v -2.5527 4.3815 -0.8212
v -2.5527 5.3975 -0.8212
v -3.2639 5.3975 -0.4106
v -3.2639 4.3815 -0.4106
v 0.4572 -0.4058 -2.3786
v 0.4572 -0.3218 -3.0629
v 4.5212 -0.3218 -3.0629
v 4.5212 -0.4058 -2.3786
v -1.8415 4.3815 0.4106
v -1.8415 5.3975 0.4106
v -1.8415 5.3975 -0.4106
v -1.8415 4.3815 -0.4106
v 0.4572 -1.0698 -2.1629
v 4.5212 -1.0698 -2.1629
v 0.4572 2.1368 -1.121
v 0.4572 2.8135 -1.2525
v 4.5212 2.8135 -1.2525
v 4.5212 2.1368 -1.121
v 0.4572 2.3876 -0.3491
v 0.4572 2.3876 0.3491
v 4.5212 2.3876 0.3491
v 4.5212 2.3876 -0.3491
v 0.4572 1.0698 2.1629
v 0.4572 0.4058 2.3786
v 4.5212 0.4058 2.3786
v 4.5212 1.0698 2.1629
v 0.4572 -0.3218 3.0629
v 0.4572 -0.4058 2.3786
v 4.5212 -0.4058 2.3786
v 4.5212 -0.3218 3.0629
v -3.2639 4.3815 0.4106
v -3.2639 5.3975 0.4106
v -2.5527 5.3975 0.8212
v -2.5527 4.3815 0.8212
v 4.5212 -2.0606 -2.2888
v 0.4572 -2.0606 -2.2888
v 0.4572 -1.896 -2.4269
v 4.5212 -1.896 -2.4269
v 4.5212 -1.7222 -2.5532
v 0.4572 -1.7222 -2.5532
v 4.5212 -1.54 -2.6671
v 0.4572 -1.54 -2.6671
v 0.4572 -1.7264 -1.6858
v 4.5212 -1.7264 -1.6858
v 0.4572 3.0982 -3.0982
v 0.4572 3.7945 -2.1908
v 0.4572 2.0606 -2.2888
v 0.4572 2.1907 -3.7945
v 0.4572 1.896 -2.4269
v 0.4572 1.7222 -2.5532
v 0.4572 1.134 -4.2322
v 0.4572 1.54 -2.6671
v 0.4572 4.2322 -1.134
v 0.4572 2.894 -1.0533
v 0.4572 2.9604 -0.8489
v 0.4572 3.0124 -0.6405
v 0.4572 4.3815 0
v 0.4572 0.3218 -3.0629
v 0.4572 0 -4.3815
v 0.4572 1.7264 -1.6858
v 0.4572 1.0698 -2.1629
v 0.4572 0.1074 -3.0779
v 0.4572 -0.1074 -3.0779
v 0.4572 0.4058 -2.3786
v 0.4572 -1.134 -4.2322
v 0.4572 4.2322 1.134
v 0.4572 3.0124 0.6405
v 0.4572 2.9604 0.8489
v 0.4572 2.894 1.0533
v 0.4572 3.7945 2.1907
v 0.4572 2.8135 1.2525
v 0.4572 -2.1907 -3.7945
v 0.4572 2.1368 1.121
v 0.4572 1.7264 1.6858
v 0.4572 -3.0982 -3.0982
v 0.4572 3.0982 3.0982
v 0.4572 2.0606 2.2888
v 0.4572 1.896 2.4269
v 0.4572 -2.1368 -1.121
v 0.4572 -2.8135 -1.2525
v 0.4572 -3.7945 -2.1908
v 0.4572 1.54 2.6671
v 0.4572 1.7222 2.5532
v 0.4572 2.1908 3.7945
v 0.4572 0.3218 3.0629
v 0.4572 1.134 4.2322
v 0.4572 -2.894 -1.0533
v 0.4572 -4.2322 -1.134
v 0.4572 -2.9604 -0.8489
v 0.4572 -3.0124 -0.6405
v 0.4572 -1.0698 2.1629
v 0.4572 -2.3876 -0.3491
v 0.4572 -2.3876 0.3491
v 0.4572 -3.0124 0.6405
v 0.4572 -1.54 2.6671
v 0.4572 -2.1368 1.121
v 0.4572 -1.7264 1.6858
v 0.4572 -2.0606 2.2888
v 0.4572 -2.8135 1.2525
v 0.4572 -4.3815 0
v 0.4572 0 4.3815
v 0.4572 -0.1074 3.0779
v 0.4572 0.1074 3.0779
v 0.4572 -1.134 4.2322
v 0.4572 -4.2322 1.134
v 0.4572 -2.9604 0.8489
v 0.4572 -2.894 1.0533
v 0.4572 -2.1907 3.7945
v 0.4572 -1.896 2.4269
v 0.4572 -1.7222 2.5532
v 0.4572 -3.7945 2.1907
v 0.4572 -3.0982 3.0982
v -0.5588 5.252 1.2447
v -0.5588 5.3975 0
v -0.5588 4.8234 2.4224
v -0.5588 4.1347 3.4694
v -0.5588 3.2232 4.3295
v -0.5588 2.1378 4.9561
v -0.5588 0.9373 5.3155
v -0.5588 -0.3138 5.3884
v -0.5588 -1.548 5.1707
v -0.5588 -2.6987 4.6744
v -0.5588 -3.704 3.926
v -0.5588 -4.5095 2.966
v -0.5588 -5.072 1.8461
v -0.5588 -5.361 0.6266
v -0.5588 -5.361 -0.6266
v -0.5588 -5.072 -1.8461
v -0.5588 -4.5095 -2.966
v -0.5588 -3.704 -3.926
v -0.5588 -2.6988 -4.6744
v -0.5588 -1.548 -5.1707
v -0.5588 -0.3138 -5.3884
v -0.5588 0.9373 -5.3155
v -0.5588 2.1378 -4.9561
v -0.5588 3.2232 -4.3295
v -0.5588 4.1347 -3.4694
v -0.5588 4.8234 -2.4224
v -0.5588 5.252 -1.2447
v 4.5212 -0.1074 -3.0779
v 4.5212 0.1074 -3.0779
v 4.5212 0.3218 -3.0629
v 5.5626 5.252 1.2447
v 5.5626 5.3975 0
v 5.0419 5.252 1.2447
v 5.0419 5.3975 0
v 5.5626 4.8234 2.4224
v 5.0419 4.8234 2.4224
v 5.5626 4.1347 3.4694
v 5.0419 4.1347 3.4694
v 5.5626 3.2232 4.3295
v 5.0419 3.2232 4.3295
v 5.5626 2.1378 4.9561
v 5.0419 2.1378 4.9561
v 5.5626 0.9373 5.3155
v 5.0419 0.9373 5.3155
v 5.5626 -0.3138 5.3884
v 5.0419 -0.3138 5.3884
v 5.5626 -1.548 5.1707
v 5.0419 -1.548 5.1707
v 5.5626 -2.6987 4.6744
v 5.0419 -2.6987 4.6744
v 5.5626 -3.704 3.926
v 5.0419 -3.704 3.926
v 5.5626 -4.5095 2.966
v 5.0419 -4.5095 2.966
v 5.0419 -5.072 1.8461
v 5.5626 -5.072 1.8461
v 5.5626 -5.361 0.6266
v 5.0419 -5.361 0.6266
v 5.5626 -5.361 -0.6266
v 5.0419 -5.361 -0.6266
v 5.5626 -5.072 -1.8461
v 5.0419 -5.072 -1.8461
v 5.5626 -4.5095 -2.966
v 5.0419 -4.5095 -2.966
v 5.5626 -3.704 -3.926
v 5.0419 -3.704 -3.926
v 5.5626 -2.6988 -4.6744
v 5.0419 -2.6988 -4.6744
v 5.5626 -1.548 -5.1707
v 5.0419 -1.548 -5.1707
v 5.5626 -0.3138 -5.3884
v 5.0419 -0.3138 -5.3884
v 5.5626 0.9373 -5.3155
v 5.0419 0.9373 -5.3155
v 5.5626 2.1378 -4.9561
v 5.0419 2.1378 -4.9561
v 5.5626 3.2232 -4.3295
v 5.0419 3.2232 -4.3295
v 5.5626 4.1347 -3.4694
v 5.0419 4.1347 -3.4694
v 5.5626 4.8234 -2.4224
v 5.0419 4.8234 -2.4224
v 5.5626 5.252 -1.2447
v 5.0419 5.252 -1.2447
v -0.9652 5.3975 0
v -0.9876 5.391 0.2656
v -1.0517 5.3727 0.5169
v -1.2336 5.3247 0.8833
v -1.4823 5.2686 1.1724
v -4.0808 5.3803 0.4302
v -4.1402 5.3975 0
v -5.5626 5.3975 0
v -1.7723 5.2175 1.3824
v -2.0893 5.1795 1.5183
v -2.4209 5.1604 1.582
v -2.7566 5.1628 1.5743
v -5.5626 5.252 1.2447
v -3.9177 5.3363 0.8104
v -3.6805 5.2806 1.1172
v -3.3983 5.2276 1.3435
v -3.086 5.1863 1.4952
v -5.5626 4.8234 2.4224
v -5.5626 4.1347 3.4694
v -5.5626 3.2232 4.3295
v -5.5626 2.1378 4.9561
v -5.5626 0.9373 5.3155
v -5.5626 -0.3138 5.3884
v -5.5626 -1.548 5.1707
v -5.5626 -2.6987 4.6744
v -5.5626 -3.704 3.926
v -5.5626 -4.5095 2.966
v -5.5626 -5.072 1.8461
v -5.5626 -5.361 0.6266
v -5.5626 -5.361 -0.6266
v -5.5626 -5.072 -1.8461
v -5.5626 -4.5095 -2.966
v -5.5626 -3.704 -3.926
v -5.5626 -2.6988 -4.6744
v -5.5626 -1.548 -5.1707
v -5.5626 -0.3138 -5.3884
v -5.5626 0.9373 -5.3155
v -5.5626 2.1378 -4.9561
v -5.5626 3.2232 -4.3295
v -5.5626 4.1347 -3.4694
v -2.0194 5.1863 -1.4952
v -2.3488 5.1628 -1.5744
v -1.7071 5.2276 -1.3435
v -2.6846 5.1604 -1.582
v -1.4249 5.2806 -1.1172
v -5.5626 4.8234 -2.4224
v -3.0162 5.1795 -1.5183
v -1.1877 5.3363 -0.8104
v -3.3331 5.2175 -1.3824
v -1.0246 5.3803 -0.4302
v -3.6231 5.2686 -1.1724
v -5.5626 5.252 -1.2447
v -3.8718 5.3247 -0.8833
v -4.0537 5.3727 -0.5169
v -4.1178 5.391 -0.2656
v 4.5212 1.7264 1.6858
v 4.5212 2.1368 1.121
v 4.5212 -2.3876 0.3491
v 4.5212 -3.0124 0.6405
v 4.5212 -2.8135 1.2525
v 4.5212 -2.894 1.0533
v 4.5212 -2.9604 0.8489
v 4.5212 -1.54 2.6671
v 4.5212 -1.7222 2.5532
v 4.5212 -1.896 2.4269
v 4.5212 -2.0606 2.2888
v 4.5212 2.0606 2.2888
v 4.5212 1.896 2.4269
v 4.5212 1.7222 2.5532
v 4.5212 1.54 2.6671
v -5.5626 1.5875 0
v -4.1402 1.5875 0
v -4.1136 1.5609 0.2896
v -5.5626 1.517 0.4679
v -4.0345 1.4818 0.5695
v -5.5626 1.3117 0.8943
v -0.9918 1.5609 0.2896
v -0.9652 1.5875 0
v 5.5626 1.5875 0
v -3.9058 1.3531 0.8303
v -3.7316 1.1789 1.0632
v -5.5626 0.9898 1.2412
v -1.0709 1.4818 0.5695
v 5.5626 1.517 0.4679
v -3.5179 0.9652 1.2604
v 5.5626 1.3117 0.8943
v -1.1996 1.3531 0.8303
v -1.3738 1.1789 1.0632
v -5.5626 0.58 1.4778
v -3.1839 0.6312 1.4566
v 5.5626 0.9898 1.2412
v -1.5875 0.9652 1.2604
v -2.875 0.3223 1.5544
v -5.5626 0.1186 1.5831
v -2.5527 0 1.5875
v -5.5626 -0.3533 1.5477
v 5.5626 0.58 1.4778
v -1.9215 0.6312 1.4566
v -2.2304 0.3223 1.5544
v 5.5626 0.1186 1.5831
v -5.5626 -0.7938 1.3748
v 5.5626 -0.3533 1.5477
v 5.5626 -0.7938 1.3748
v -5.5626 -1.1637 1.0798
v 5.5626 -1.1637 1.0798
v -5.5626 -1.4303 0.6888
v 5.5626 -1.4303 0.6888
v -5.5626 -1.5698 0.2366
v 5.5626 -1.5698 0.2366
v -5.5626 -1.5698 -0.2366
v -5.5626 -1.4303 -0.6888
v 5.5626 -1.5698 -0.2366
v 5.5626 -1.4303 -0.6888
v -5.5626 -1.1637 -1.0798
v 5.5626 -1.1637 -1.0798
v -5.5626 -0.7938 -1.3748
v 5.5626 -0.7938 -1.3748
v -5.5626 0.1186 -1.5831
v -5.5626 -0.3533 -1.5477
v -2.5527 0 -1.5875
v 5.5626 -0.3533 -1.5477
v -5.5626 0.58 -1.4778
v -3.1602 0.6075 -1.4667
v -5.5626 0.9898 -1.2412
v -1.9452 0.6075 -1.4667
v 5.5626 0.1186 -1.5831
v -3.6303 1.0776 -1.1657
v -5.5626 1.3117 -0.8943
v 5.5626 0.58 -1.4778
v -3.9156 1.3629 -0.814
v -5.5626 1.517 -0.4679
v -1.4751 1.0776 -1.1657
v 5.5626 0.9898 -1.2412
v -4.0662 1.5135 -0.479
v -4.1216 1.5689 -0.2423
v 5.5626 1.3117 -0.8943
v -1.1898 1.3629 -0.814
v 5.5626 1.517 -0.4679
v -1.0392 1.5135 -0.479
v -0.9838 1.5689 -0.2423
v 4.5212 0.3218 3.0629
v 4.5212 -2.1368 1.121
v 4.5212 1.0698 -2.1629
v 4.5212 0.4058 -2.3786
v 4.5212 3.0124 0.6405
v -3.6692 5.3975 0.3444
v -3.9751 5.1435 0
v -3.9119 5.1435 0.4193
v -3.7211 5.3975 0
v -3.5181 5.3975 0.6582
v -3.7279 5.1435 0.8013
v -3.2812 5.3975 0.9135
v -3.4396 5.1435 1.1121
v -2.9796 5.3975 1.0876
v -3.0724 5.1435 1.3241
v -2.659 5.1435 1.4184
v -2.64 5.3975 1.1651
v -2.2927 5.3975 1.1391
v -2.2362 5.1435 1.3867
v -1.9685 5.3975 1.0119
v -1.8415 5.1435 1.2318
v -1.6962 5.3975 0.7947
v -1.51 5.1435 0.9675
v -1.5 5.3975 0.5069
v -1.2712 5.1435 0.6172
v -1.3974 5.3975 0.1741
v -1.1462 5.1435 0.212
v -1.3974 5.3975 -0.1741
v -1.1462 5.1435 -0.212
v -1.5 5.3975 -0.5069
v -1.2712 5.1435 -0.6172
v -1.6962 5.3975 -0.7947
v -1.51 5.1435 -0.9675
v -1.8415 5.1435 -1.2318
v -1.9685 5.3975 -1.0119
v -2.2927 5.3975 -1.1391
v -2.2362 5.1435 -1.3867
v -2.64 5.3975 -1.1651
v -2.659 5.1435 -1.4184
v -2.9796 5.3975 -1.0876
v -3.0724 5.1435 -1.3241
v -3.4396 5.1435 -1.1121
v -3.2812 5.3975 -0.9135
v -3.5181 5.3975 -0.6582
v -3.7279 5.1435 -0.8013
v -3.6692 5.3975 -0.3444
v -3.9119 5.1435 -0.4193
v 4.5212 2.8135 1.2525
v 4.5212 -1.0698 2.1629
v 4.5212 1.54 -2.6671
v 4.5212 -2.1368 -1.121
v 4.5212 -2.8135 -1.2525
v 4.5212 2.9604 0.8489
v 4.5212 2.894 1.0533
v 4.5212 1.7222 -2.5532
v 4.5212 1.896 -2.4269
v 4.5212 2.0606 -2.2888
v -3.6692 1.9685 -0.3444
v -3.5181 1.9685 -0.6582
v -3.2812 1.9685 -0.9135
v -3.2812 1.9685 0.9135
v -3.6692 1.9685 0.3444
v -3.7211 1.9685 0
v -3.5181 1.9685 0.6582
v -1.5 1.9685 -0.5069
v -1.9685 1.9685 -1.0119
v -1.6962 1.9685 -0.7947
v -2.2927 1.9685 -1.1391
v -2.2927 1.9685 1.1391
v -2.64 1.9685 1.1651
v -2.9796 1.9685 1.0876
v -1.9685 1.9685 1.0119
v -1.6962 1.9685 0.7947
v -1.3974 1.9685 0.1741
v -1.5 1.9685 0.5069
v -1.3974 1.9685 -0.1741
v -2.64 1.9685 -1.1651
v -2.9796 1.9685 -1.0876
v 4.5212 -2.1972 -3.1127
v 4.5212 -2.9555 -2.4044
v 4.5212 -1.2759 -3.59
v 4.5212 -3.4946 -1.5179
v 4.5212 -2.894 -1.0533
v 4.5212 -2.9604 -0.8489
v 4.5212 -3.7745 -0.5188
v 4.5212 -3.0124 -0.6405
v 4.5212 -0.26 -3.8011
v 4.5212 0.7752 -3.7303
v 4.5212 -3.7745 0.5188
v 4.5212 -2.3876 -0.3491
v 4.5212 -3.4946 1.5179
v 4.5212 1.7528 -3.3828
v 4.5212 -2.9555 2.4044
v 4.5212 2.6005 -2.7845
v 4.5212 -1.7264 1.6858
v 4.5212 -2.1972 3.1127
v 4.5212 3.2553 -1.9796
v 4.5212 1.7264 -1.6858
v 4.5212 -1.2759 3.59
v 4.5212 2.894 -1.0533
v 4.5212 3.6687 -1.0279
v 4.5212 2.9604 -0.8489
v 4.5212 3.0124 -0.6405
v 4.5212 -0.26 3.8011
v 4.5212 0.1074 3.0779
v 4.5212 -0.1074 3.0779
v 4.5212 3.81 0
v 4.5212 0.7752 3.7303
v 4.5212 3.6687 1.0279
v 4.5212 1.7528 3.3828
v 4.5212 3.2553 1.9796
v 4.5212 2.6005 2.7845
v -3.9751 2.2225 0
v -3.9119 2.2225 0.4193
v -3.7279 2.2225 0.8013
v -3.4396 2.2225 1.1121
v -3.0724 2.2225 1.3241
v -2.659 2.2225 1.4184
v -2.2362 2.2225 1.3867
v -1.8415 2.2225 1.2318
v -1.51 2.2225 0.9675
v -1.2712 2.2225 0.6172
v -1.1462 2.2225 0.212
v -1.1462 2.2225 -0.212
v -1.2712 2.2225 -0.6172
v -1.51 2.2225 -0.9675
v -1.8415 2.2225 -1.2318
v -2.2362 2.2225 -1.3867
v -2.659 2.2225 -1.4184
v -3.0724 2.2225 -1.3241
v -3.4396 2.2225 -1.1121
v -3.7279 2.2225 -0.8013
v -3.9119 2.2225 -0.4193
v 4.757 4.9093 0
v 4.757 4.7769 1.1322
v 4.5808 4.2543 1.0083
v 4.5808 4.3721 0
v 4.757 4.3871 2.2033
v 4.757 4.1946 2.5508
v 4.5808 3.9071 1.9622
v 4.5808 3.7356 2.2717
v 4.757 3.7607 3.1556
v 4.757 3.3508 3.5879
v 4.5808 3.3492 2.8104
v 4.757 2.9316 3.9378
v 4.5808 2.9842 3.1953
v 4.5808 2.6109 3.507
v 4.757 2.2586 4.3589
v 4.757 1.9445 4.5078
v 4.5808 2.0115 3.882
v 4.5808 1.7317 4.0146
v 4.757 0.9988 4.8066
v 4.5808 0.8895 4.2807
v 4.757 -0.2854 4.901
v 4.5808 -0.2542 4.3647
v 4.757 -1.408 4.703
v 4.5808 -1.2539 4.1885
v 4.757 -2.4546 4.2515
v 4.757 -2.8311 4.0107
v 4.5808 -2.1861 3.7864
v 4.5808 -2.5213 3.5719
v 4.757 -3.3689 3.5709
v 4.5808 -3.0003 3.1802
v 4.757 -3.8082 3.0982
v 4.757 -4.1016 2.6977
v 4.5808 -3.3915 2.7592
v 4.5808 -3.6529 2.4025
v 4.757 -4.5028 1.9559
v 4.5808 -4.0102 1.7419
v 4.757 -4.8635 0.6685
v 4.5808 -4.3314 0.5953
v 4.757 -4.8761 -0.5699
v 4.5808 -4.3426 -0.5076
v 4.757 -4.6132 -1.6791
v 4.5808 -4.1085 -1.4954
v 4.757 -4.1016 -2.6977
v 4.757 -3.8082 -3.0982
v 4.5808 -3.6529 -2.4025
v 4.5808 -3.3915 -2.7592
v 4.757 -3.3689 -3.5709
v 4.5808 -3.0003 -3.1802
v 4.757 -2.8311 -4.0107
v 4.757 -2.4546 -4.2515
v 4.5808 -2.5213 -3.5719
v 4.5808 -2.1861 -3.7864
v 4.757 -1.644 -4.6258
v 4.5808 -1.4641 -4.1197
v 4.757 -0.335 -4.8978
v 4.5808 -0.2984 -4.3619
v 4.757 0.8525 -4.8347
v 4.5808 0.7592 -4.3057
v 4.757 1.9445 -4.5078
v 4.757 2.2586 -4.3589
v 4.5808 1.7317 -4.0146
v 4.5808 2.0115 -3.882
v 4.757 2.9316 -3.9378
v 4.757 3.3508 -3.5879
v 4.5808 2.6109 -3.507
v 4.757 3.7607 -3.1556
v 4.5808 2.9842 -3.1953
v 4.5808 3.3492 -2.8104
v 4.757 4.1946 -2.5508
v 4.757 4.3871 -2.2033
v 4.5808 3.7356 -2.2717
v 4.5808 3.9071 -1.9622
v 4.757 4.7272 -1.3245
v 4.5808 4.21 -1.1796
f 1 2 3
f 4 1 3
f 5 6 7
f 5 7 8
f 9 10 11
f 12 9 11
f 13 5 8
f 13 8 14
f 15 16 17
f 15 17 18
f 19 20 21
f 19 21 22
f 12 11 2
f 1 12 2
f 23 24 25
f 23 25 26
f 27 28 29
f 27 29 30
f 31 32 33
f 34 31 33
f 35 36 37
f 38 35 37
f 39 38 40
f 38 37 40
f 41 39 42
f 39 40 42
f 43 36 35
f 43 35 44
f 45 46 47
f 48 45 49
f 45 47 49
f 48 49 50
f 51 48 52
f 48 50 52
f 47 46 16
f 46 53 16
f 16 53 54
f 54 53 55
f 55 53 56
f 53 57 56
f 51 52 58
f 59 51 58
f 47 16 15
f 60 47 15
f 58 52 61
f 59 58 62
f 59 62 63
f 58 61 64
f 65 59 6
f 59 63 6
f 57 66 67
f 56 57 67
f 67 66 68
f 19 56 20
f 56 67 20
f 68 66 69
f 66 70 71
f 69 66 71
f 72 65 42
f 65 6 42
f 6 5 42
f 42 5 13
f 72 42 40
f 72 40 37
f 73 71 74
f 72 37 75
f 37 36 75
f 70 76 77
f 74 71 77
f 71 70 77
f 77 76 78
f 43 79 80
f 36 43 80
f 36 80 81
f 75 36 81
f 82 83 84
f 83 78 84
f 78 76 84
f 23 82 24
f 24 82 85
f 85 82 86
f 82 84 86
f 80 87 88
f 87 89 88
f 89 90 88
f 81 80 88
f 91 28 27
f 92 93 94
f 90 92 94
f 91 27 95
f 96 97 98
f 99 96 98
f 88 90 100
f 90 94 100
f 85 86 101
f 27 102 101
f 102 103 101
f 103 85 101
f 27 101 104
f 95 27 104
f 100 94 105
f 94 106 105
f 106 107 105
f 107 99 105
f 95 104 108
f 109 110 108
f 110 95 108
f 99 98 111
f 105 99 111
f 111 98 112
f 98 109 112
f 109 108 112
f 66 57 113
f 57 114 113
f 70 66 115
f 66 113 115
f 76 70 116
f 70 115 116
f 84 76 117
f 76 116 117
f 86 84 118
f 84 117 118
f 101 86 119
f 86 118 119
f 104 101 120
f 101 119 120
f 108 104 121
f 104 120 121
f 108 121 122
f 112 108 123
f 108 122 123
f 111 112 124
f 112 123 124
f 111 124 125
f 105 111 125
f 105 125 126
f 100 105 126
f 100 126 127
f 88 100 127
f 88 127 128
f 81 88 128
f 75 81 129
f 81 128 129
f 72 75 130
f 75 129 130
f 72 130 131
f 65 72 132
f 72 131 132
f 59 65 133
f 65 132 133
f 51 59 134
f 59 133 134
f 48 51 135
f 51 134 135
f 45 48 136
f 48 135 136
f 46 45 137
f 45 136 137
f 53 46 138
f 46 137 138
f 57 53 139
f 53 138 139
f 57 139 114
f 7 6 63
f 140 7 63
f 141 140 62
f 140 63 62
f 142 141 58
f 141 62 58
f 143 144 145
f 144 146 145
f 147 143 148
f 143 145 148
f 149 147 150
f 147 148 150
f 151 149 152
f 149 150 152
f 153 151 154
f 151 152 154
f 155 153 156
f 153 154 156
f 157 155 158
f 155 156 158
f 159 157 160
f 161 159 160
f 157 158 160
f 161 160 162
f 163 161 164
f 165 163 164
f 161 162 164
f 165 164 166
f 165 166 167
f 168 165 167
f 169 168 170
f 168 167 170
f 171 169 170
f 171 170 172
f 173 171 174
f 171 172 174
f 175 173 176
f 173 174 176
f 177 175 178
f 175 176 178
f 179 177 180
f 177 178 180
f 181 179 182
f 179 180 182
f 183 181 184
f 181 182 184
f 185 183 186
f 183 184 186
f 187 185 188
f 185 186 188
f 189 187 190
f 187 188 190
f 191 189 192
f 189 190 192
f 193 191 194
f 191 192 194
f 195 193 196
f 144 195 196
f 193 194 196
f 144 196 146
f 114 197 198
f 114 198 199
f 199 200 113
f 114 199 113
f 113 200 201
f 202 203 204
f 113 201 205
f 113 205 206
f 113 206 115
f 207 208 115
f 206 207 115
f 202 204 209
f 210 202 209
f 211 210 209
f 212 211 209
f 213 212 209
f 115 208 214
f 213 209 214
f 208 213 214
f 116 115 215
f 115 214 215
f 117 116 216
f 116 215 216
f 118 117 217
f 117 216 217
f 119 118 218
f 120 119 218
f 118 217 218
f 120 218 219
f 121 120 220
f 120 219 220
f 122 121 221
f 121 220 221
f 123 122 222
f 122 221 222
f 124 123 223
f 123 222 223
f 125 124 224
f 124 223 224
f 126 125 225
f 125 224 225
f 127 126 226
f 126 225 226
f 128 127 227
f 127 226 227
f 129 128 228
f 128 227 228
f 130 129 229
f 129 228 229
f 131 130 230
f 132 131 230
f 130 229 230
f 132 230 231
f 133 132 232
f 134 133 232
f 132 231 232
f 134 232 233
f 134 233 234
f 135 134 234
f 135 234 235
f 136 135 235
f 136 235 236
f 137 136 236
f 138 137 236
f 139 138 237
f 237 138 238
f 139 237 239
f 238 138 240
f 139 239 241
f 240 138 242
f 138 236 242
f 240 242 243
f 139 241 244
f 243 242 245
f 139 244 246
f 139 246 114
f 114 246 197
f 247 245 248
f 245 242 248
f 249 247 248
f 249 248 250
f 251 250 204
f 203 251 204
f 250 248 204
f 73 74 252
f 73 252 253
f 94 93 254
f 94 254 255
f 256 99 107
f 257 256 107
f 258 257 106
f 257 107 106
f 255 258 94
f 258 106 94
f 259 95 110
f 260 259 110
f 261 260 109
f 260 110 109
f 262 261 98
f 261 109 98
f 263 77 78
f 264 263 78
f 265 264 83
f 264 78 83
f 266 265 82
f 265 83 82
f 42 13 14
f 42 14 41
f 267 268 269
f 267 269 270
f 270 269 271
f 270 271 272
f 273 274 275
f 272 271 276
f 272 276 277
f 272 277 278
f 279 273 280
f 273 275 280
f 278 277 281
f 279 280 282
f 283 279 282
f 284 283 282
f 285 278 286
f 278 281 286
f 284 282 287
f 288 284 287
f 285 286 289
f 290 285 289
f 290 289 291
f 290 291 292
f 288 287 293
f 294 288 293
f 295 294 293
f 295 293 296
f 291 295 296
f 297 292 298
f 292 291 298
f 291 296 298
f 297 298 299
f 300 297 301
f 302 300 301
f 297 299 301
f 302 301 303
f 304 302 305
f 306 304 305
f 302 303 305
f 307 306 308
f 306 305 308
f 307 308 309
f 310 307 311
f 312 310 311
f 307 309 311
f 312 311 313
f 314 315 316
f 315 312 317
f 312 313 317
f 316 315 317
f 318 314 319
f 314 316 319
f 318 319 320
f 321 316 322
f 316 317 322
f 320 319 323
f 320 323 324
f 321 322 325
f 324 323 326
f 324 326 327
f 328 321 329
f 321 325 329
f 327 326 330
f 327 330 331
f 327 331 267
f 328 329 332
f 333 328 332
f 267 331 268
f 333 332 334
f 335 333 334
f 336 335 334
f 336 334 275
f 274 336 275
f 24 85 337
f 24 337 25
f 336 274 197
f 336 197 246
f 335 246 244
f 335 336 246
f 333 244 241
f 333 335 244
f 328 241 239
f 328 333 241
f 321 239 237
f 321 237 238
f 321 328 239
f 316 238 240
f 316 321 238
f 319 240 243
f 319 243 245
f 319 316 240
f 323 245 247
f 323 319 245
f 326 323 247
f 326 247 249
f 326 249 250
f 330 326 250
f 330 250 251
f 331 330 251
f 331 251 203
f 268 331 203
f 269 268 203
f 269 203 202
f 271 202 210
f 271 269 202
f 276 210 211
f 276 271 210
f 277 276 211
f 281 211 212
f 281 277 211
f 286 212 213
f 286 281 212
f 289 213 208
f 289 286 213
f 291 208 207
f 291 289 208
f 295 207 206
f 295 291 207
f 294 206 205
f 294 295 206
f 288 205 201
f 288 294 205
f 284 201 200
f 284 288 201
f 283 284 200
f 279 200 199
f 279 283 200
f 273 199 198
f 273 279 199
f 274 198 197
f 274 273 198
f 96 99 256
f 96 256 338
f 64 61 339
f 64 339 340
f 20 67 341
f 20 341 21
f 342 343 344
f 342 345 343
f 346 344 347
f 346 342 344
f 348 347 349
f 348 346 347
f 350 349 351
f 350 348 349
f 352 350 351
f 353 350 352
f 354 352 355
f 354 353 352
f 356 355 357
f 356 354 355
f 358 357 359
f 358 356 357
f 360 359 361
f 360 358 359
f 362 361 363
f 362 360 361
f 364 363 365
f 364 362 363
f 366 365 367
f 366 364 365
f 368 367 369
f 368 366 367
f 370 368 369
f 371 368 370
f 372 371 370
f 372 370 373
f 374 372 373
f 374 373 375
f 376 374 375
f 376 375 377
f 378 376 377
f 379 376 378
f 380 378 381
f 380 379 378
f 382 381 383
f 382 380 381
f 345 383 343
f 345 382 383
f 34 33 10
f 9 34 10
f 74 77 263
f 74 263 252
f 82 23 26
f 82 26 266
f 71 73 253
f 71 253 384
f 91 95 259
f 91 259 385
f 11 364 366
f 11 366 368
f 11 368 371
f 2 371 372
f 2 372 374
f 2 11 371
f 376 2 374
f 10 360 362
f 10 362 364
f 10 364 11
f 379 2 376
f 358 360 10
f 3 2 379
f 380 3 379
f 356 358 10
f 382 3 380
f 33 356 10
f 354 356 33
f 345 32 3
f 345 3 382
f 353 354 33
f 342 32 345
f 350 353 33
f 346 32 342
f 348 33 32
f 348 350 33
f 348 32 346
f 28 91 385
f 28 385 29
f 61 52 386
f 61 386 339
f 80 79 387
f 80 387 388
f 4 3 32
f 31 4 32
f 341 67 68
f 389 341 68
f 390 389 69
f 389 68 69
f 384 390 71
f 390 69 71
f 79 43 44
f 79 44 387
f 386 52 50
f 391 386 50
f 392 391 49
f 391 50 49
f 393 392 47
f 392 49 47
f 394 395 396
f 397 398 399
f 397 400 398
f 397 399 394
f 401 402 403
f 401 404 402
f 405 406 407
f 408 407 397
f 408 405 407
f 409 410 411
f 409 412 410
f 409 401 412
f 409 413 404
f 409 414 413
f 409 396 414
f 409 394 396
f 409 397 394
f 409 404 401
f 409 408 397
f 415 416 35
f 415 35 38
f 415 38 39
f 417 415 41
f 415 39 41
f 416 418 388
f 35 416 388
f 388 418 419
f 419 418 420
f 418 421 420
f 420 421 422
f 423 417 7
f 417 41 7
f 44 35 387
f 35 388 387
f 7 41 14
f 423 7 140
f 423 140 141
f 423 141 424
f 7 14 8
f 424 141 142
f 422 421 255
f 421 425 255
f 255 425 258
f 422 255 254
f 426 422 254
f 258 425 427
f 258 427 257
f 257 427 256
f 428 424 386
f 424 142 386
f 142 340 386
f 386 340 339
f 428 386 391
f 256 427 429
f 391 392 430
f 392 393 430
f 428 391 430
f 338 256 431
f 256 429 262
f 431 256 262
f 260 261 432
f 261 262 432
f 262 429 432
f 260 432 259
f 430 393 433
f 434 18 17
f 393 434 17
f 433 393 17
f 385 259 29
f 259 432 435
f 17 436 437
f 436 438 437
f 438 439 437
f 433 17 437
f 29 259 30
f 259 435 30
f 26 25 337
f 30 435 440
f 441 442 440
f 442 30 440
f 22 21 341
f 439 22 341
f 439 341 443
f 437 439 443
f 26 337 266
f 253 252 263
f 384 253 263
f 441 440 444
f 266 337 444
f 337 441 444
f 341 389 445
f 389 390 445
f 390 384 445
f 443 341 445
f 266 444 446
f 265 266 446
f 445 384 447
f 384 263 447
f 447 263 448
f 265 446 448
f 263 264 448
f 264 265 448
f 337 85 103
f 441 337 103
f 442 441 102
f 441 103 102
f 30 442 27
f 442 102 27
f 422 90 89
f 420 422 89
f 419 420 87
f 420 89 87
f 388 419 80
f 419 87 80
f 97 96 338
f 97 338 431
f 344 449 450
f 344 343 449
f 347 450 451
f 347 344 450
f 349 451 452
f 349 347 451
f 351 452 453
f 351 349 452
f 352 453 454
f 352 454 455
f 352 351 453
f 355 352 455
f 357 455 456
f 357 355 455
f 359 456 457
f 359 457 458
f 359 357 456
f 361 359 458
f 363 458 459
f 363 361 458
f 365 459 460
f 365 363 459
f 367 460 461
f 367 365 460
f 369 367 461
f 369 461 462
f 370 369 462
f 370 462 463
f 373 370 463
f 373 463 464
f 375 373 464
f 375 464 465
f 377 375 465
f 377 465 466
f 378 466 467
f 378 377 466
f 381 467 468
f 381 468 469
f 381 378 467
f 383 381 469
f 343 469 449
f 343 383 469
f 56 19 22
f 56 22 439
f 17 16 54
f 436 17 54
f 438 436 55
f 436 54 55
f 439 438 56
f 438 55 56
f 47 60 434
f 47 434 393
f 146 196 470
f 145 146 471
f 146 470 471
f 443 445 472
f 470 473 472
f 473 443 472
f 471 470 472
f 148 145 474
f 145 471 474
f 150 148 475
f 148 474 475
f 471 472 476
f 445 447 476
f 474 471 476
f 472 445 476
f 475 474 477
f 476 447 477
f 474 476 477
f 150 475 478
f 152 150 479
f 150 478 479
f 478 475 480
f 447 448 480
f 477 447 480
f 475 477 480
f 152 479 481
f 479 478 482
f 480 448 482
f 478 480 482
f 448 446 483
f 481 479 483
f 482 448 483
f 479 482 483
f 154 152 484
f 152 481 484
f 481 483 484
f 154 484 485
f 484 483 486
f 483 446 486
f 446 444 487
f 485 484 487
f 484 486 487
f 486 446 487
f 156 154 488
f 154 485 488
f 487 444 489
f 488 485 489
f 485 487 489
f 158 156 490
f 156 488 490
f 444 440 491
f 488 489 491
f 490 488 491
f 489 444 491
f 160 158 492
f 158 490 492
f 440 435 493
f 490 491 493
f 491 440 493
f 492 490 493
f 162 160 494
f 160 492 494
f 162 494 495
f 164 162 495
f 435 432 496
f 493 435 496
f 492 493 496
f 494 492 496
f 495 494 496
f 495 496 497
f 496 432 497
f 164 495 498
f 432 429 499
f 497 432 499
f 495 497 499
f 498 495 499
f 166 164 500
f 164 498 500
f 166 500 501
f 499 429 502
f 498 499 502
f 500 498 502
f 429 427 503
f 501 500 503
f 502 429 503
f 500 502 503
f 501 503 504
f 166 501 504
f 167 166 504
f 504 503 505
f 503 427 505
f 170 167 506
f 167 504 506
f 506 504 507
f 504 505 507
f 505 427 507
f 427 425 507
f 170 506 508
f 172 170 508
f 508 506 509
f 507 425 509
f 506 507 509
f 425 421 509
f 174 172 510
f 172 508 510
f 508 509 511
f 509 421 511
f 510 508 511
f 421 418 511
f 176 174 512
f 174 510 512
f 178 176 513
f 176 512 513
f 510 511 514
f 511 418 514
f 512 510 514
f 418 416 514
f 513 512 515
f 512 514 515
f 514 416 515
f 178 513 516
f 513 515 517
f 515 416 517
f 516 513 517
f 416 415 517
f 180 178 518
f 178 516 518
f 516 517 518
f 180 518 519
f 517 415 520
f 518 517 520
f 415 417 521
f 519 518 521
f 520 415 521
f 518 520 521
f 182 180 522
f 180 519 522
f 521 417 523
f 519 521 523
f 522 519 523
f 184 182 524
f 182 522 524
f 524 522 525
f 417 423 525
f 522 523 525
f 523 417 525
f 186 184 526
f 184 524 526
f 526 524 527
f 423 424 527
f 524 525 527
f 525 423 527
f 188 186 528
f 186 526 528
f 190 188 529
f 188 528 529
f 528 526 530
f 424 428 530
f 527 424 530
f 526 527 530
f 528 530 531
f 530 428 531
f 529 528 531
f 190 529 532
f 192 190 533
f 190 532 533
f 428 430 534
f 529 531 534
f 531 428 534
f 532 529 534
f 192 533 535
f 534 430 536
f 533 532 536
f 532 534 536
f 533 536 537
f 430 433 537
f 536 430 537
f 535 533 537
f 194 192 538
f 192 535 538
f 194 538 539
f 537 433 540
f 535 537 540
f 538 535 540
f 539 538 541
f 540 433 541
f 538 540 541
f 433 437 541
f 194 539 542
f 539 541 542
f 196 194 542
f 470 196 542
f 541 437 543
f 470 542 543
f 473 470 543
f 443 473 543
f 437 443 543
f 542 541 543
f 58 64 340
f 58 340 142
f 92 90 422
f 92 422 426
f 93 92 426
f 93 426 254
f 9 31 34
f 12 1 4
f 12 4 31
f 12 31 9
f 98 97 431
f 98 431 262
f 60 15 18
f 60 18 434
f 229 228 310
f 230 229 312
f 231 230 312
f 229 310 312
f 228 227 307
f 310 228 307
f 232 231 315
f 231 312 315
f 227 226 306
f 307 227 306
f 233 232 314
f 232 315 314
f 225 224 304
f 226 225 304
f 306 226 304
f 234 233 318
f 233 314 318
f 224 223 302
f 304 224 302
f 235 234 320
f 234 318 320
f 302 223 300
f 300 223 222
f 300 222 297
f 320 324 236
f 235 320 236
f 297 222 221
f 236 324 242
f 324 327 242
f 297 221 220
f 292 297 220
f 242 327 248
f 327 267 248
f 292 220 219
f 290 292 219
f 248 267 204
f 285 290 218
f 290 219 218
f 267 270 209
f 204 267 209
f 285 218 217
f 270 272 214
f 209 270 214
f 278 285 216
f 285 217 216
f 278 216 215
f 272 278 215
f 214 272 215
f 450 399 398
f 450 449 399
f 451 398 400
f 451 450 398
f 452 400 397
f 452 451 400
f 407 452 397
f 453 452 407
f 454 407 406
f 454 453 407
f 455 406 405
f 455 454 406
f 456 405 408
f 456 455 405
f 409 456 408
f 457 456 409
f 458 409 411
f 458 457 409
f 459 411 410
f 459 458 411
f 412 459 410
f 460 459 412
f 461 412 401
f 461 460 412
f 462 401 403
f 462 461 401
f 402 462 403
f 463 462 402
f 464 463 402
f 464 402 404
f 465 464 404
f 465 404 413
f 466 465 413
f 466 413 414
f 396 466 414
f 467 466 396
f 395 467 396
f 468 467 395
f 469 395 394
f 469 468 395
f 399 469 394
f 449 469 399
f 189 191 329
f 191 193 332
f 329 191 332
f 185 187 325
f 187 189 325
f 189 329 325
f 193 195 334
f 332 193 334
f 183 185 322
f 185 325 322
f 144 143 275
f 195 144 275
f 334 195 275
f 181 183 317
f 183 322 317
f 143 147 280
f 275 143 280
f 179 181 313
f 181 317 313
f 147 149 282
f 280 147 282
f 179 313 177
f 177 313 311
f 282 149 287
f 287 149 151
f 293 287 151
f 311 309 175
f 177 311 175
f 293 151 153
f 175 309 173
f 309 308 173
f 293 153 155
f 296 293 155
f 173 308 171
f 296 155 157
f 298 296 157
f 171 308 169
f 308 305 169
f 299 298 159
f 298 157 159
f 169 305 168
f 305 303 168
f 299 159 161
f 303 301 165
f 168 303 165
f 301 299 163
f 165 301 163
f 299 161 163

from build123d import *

# Parameters (mm, degrees)
SKETCH4_R          = 3.2385
SKETCH4_R_2        = 3.07975
CUT_EXTRUDE2_DEPTH = 4.064
CUT_EXTRUDE1_DEPTH = 4.064
CIRPATTERN1_COUNT  = 10
SKETCH6_R          = 1.5875
CUT_EXTRUDE3_DEPTH = 6.3975
CUT_EXTRUDE4_DEPTH = 1.016


with BuildPart() as part:
    # Sketch1 → Revolve1 (revolve)
    with BuildSketch(Plane.XY):
        with BuildLine():
            Line((-5.5626, 1.5875), (5.5626, 1.5875))
            Line((5.5626, 1.5875), (5.5626, 5.3975))
            Line((5.5626, 5.3975), (5.0419, 5.3975))
            ThreePointArc((5.0419, 5.3975), (4.654699632, 4.645356921), (4.5212, 3.81))
            Line((4.5212, 3.81), (4.5212, 3.2385))
            Line((4.5212, 3.2385), (0.4572, 3.2385))
            Line((0.4572, 3.2385), (0.4572, 4.3815))
            Line((0.4572, 4.3815), (-0.5588, 5.3975))
            Line((-0.5588, 5.3975), (-5.5626, 5.3975))
            Line((-5.5626, 5.3975), (-5.5626, 1.5875))
        make_face()
    revolve(axis=Axis((-5.5626, 0, 0), (1, 0, 0)))

    # Sketch4 → Cut-Extrude2 (cut)
    with BuildSketch(Plane(origin=(0.4572, 0, 0), x_dir=(0, 0, -1), z_dir=(1, 0, 0))):
        Circle(SKETCH4_R)
        Circle(SKETCH4_R_2, mode=Mode.SUBTRACT)
    extrude(amount=CUT_EXTRUDE2_DEPTH, mode=Mode.SUBTRACT)

    # Sketch3 → Cut-Extrude1 (cut)
    with BuildSketch(Plane(origin=(0.4572, 0, 0), x_dir=(0, 0, -1), z_dir=(1, 0, 0))):
        with BuildLine():
            Line((-0.640454656, 3.012420604), (-0.349102168, 2.387613176))
            Line((-0.349102168, 2.387613176), (0.349102168, 2.387613176))
            Line((0.349102168, 2.387613176), (0.640454656, 3.012420604))
            ThreePointArc((0.640454656, 3.012420604), (0, 3.07975), (-0.640454656, 3.012420604))
        make_face()
    cut_extrude1 = extrude(amount=CUT_EXTRUDE1_DEPTH, mode=Mode.SUBTRACT)

    # CirPattern1: Cut-Extrude1 ×10 about axis
    cirpattern1_axis = Axis((0, 0, 0), (1, 0, 0))
    for i in range(1, CIRPATTERN1_COUNT):
        add(cut_extrude1.rotate(cirpattern1_axis, i * 360 / CIRPATTERN1_COUNT), mode=Mode.SUBTRACT)

    # Sketch6 → Cut-Extrude3 (cut, through all)
    with BuildSketch(Plane(origin=(0, 0, 0), x_dir=(1, 0, 0), z_dir=(0, 1, 0))):
        with Locations((-2.5527, 0)):
            Circle(SKETCH6_R)
    extrude(amount=CUT_EXTRUDE3_DEPTH, mode=Mode.SUBTRACT)


with BuildPart() as body_2:
    # Sketch7 → Revolve2 (revolve)
    with BuildSketch(Plane.XY):
        Polygon((-3.7211, 5.3975), (-2.5527, 5.3975), (-2.5527, 1.9685), (-3.7211, 1.9685), (-3.9751, 2.2225), (-3.9751, 5.1435), align=None)
    revolve(axis=Axis((-2.5527, 1.9685, 0), (0, 1, 0)))

    # Sketch8 → Cut-Extrude4 (cut)
    with BuildSketch(Plane(origin=(0, 5.3975, 0), x_dir=(1, 0, 0), z_dir=(0, 1, 0))):
        Polygon((-2.5527, 0.821223023), (-3.2639, 0.410611511), (-3.2639, -0.410611511), (-2.5527, -0.821223023), (-1.8415, -0.410611511), (-1.8415, 0.410611511), align=None)
    extrude(amount=-CUT_EXTRUDE4_DEPTH, mode=Mode.SUBTRACT)


solid = Compound([part.part, body_2.part])
